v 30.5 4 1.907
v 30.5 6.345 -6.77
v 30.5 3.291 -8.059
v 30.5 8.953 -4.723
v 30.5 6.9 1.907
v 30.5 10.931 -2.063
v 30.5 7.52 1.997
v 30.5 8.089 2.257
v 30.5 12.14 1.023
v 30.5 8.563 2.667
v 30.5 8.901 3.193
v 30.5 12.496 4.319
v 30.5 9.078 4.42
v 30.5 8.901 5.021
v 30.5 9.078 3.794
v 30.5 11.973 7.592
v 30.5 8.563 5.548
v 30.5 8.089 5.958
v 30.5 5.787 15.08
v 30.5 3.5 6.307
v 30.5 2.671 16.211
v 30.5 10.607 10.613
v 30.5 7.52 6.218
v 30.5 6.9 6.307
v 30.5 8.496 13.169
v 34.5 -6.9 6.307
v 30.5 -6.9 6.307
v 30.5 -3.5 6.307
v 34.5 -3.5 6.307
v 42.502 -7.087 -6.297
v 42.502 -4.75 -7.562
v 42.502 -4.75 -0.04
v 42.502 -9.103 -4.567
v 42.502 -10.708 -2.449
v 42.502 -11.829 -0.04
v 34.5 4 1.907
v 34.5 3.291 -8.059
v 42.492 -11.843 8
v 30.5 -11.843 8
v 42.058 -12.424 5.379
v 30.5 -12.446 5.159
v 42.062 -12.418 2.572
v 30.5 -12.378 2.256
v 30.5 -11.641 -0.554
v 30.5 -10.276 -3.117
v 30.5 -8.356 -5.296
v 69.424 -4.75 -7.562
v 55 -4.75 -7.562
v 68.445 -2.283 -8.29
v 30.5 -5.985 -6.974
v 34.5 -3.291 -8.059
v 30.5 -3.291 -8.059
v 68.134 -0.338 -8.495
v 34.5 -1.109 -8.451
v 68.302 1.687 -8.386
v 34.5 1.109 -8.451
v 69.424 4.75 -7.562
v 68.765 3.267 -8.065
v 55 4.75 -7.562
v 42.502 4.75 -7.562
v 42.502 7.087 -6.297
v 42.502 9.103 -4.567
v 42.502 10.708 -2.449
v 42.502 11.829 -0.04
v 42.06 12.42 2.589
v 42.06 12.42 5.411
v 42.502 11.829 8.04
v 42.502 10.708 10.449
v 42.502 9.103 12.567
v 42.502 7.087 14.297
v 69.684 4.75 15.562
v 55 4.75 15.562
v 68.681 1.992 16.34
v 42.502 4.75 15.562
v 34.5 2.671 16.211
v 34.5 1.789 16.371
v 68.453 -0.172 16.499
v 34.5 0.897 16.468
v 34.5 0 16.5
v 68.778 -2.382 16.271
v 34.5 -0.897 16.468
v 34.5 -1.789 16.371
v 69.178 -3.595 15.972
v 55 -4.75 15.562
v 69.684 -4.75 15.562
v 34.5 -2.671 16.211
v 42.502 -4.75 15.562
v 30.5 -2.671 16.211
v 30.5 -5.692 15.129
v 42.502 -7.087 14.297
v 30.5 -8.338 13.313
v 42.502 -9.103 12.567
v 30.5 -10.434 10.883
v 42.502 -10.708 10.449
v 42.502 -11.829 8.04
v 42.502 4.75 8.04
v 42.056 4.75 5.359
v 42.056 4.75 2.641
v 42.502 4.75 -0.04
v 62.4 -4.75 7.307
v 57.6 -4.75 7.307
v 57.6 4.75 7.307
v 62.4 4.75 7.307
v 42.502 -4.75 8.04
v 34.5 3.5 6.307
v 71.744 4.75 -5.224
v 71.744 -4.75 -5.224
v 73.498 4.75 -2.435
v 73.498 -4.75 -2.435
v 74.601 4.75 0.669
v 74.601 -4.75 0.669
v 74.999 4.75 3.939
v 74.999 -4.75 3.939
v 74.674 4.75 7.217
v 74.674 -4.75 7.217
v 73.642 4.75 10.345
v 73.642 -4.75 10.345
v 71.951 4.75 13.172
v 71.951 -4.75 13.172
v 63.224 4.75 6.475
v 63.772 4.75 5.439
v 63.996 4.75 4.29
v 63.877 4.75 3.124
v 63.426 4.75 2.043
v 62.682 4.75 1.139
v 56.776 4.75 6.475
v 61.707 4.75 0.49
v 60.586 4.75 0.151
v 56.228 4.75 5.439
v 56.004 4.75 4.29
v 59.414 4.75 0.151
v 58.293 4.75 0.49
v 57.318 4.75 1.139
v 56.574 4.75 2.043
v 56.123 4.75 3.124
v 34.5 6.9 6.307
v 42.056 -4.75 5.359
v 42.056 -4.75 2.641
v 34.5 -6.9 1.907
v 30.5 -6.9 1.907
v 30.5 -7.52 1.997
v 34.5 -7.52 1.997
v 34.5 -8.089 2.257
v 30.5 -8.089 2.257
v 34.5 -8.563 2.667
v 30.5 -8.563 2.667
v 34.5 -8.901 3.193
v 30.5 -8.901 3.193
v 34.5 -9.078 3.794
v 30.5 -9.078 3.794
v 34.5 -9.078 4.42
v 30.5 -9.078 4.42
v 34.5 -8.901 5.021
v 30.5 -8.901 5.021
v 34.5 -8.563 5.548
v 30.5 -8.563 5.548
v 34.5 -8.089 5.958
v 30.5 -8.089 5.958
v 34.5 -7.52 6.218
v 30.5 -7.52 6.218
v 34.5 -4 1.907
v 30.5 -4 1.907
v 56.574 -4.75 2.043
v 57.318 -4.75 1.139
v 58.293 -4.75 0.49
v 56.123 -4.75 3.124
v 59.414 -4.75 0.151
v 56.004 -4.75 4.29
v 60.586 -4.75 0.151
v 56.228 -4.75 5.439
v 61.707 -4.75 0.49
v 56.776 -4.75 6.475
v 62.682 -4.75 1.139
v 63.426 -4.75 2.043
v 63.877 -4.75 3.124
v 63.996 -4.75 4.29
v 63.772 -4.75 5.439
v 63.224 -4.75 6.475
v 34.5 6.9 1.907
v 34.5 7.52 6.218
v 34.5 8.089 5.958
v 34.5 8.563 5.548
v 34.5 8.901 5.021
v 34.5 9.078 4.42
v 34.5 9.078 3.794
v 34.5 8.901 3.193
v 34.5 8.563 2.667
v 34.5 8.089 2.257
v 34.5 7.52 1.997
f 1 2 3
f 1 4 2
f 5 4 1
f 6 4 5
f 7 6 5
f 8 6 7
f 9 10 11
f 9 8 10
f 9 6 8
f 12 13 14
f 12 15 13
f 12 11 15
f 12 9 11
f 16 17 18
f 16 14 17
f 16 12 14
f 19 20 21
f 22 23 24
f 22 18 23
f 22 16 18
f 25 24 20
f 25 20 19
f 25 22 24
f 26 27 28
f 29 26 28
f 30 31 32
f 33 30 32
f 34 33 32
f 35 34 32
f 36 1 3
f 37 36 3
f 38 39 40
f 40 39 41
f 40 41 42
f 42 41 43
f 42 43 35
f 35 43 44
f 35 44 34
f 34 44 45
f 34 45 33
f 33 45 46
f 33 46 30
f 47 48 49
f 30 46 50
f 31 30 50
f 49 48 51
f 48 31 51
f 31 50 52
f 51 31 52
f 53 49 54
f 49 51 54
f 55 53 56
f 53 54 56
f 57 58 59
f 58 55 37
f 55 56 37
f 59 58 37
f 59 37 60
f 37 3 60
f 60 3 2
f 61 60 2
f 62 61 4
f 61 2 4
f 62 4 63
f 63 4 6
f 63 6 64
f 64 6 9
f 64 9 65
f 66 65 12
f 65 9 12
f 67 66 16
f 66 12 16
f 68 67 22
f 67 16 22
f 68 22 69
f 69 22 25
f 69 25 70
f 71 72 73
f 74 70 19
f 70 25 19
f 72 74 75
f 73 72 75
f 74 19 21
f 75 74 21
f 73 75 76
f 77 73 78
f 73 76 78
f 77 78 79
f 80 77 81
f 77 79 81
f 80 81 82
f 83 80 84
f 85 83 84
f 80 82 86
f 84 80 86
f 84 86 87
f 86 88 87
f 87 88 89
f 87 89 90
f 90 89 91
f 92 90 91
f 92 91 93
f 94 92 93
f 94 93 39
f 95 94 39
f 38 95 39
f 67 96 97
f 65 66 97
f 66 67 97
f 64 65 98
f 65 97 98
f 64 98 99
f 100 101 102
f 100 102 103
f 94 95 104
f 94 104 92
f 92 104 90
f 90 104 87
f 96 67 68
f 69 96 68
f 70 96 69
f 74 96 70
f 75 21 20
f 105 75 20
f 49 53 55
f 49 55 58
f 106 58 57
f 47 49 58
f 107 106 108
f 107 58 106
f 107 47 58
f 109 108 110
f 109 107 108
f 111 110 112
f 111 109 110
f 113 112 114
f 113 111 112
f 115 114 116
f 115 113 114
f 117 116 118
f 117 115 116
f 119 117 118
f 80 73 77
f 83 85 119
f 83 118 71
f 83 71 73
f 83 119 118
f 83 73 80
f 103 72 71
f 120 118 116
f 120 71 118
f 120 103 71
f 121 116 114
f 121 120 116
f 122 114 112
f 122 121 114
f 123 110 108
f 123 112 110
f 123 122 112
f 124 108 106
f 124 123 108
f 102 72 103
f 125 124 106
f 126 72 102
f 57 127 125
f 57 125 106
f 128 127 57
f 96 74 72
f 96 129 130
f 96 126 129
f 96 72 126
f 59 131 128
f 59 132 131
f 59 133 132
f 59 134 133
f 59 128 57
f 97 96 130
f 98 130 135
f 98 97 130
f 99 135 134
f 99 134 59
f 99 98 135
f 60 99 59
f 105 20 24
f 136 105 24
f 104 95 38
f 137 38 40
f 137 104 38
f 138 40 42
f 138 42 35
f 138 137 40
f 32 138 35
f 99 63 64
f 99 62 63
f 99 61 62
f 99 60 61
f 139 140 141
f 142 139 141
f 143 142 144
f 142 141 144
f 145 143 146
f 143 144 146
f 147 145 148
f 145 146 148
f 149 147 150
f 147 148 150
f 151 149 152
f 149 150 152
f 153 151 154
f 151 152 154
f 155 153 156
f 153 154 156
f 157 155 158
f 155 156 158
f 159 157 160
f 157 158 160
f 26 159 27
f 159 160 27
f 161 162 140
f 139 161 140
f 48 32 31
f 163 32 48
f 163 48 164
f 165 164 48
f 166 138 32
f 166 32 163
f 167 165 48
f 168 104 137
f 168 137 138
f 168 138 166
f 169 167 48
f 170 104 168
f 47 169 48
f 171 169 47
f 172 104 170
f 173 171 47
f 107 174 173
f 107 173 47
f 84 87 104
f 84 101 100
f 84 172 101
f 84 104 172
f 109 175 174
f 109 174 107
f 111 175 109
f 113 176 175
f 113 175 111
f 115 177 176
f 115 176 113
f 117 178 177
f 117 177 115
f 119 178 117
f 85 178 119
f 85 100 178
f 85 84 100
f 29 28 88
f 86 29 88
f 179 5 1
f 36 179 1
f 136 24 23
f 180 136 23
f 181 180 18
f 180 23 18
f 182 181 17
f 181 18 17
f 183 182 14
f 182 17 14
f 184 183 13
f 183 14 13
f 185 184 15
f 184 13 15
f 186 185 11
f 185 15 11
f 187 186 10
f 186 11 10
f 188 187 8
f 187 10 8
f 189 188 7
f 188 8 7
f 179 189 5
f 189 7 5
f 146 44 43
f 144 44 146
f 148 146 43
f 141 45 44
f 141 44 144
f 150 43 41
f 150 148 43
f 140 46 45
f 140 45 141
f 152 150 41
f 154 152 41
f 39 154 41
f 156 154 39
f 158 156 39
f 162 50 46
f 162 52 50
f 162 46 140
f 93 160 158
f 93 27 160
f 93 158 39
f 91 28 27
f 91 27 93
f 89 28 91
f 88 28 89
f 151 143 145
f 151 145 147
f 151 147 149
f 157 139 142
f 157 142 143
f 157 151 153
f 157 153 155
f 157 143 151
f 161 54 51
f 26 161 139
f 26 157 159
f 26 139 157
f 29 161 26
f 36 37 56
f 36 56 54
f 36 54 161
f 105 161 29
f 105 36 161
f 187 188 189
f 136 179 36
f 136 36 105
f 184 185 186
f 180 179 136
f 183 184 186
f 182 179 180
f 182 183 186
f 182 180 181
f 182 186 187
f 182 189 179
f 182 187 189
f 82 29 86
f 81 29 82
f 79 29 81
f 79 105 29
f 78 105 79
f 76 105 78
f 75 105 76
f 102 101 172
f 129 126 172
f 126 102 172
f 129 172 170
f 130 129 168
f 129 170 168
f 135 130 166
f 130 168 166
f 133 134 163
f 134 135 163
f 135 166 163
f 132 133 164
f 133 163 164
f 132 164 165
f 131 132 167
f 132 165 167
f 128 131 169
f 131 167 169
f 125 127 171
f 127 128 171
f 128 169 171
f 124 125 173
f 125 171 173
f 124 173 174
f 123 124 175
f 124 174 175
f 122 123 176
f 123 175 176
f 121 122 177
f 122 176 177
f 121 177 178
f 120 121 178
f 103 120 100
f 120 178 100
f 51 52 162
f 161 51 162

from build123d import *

# Parameters (mm, degrees)
SKETCH_1_W                = 50
SKETCH_1_H                = 40
EXTRUDE_1_DEPTH           = 8
CHAMFER_1_SIZE            = 10
SKETCH_2_R                = 1.55
CUT_EXTRUDE_1_DEPTH       = 10
EXTRUDE_2_DEPTH           = 50
EXTRUDE_2_DEPTH_BACK      = 15
SKETCH_3_R                = 12.5
SKETCH_4_R                = 1.7
CUT_EXTRUDE_2_DEPTH       = 15
CUT_EXTRUDE_START         = -20
CUT_EXTRUDE_3_DEPTH       = 20
SKETCH_7_R                = 16.5
CUT_EXTRUDE_8_DEPTH       = 33
CUT_EXTRUDE_9_DEPTH       = 20
CHAMFER_3_SIZE            = 2
SKETCH_10_OUTSIDE_W       = 49.114
SKETCH_10_OUTSIDE_H       = 64.114
SKETCH_10_OUTSIDE_R       = 12.5
CUT_EXTRUDE_10_DEPTH      = 10
CHAMFER_4_SIZE            = 10
SKETCH_12_W               = 1.5
SKETCH_12_H               = 20
SKETCH_14_W               = 12
SKETCH_14_H               = 23
CUT_EXTRUDE_11_DEPTH      = 3
CUT_EXTRUDE_12_DEPTH      = 4.2
SKETCH_16_R               = 1.1
CUT_EXTRUDE_13_DEPTH      = 5
SKETCH_17_R               = 3.372674955
EXTRUDE_3_DEPTH           = 4
SKETCH_18_R               = 1.1
CUT_EXTRUDE_14_DEPTH      = 4
SKETCH_20_R               = 4
CUT_EXTRUDE_15_DEPTH      = 4
CUT_EXTRUDE_16_DEPTH      = 80.355214185
CUT_EXTRUDE_16_DEPTH_BACK = 80.355214185
SKETCH_21_W               = 47.755098741
SKETCH_21_H               = 76.122443719
SKETCH_26_R               = 4
CUT_EXTRUDE_19_DEPTH      = 20
SKETCH_28_W               = 34.99561618
SKETCH_28_H               = 41.128829021
CUT_EXTRUDE_20_DEPTH      = 10
SKETCH_29_W               = 7.599941767
SKETCH_29_H               = 6.479768366
EXTRUDE_6_DEPTH           = 9.5
SKETCH_24_R               = 12.607397707
CUT_EXTRUDE_21_DEPTH      = 15
CUT_EXTRUDE_22_DEPTH      = 4


# Read off the part's stored shape, not the designer's step: 切除-拉伸3
with BuildPart() as part:
    # 草图1 → 凸台-拉伸1 (new body)
    with BuildSketch(Plane.XY):
        Rectangle(SKETCH_1_W, SKETCH_1_H)
    extrude(amount=EXTRUDE_1_DEPTH)

    # 倒角1
    chamfer_1_edges = [part.edges().sort_by_distance(p)[0] for p in [
        (-25, -20, 4),
        (-25, 20, 4),
    ]]
    chamfer(chamfer_1_edges, length=CHAMFER_1_SIZE)

    # 草图2 → 切除-拉伸1 (cut)
    with BuildSketch(Plane.XY.offset(8)):
        with Locations((-2, -10)):
            Circle(SKETCH_2_R)
        with Locations((-2, 10)):
            Circle(SKETCH_2_R)
    extrude(amount=-CUT_EXTRUDE_1_DEPTH, mode=Mode.SUBTRACT)

    # 草图3 → 凸台-拉伸2 (add, two sides: drawn at the far end of the back side and taken through both)
    with BuildSketch(Plane(origin=(25, 0, 0), x_dir=(0, 0, -1), z_dir=(1, 0, 0)).offset(-EXTRUDE_2_DEPTH_BACK)):
        with Locations(Location((-4, 0, 0), (0, 0, 251.337075115))):
            Circle(SKETCH_3_R)
    extrude(amount=EXTRUDE_2_DEPTH + EXTRUDE_2_DEPTH_BACK)

    # 草图4 → 切除-拉伸2 (cut)
    with BuildSketch(Plane.XY.offset(8)):
        with Locations((-19.690178066, -4)):
            Circle(SKETCH_4_R)
        with Locations((-19.690178066, 4)):
            Circle(SKETCH_4_R)
    extrude(amount=-CUT_EXTRUDE_2_DEPTH, mode=Mode.SUBTRACT)

    # 切除-拉伸3 outline → 切除-拉伸3 (cut)
    with BuildSketch(Plane(origin=(75, 0, 0), x_dir=(0, 0, -1), z_dir=(1, 0, 0)).offset(CUT_EXTRUDE_START)):
        with BuildLine():
            Line((7.56233108, -4.75), (-15.56233108, -4.75))
            ThreePointArc((-15.56233108, -4.75), (-4, -12.5), (7.56233108, -4.75))
        make_face()
        with BuildLine():
            ThreePointArc((7.56233108, 4.75), (-4, 12.5), (-15.56233108, 4.75))
            Line((-15.56233108, 4.75), (7.56233108, 4.75))
        make_face()
    extrude(amount=CUT_EXTRUDE_3_DEPTH, mode=Mode.SUBTRACT)

    # 草图7 → 切除-拉伸8 (cut)
    with BuildSketch(Plane.XZ.offset(4.75)):
        with Locations((58.5, 4)):
            Circle(SKETCH_7_R)
    cut_extrude_8 = extrude(amount=CUT_EXTRUDE_8_DEPTH, mode=Mode.SUBTRACT)

    # 镜向1: 切除-拉伸8 across plane
    add(cut_extrude_8.mirror(Plane.ZX), mode=Mode.SUBTRACT)

    # 草图8 → 切除-拉伸9 (cut)
    with BuildSketch(Plane.XZ.offset(4.75)):
        with BuildLine():
            Line((60, 19.107397707), (75.764252489, 33.62580965))
            Line((75.764252489, 33.62580965), (78.826270749, -18.347337912))
            Line((78.826270749, -18.347337912), (60, -10.892602293))
            ThreePointArc((60, -10.892602293), (75, 4.107397707), (60, 19.107397707))
        make_face()
    extrude(amount=-CUT_EXTRUDE_9_DEPTH, mode=Mode.SUBTRACT)

    # 倒角3
    chamfer_3_edges = [part.edges().sort_by_distance(p)[0] for p in [
        (10, 0, 16.5),
        (10, 0, -8.5),
    ]]
    chamfer(chamfer_3_edges, length=CHAMFER_3_SIZE)

    # 草图10 outside → 切除-拉伸10 (cut)
    with BuildSketch(Plane(origin=(25, 0, 0), x_dir=(0, 0, -1), z_dir=(1, 0, 0))):
        with Locations((-4, 0)):
            Rectangle(SKETCH_10_OUTSIDE_W, SKETCH_10_OUTSIDE_H)
        with Locations((-4.107397707, 0)):
            Circle(SKETCH_10_OUTSIDE_R, mode=Mode.SUBTRACT)
    extrude(amount=-CUT_EXTRUDE_10_DEPTH, mode=Mode.SUBTRACT)

    # 倒角4
    # the kernel refuses this chamfer: 10 mm, written as the material it takes off along each edge
    with BuildSketch(Plane(origin=(15, -20, -25.71682988), x_dir=(-0.9996219169112968, -0.027495876610586317, 0), z_dir=(0, 0, 1))) as chamfer_4_piece_1_section:
        Polygon((CHAMFER_4_SIZE * 0.999621916911, -CHAMFER_4_SIZE * 0.0274958766106), (-CHAMFER_4_SIZE * 0.0274958766106, -CHAMFER_4_SIZE * 0.999621916911), (0, 0), align=None)
    chamfer_4_piece_1 = extrude(amount=59.433659759, mode=Mode.PRIVATE)
    chamfer_4_piece_1 = chamfer_4_piece_1 - Plane(origin=(11.669205873, 0, 4.107397707), x_dir=(0, 0, -1), z_dir=(1, 0, 0)) * Cylinder(12.5, 159, mode=Mode.PRIVATE)
    add(chamfer_4_piece_1, mode=Mode.SUBTRACT)
    with BuildSketch(Plane(origin=(15, 20, 33.71682988), x_dir=(-0.9996219169112968, 0.027495876610586317, 0), z_dir=(0, 0, -1))) as chamfer_4_piece_2_section:
        Polygon((CHAMFER_4_SIZE * 0.999621916911, -CHAMFER_4_SIZE * 0.0274958766106), (-CHAMFER_4_SIZE * 0.0274958766106, -CHAMFER_4_SIZE * 0.999621916911), (0, 0), align=None)
    chamfer_4_piece_2 = extrude(amount=59.433659759, mode=Mode.PRIVATE)
    chamfer_4_piece_2 = chamfer_4_piece_2 - Plane(origin=(11.669205873, 0, 4.107397707), x_dir=(0, 0, -1), z_dir=(1, 0, 0)) * Cylinder(12.5, 159, mode=Mode.PRIVATE)
    add(chamfer_4_piece_2, mode=Mode.SUBTRACT)

    # 草图12 → 切除-旋转2 (revolve, cut)
    with BuildSketch(Plane(origin=(0, 0, 0), x_dir=(1, 0, 0), z_dir=(0, 1, 0))):
        with Locations((14.75, 8.392602293)):
            Rectangle(SKETCH_12_W, SKETCH_12_H)
    revolve(axis=Axis((50, 0, 4.107397707), (-1, 0, 0)), mode=Mode.SUBTRACT)

    # 草图14 → 切除-拉伸11 (cut)
    with BuildSketch(Plane(origin=(0, 0, 0), x_dir=(-1, 0, 0), z_dir=(0, 0, -1))):
        with Locations((2, 4.65)):
            Rectangle(SKETCH_14_W, SKETCH_14_H)
    extrude(amount=-CUT_EXTRUDE_11_DEPTH, mode=Mode.SUBTRACT)

    # 草图15 → 切除-拉伸12 (cut)
    with BuildSketch(Plane(origin=(0, 0, 3), x_dir=(-1, 0, 0), z_dir=(0, 0, -1))):
        with BuildLine():
            ThreePointArc((4.631967524, 4.49702381), (2, 16.1), (-0.631967524, 4.49702381))
            ThreePointArc((-0.631967524, 4.49702381), (2, 0.95), (4.631967524, 4.49702381))
        make_face()
    extrude(amount=-CUT_EXTRUDE_12_DEPTH, mode=Mode.SUBTRACT)

    # 草图16 → 切除-拉伸13 (cut)
    with BuildSketch(Plane(origin=(0, 0, 0), x_dir=(-1, 0, 0), z_dir=(0, 0, -1))):
        with Locations((2, 18.3)):
            Circle(SKETCH_16_R)
    extrude(amount=-CUT_EXTRUDE_13_DEPTH, mode=Mode.SUBTRACT)

    # 草图17 → 凸台-拉伸3 (add)
    with BuildSketch(Plane(origin=(0, 0, 0), x_dir=(-1, 0, 0), z_dir=(0, 0, -1))):
        with Locations((2, -10)):
            Circle(SKETCH_17_R)
    extrude(amount=-EXTRUDE_3_DEPTH)

    # 草图18 → 切除-拉伸14 (cut)
    with BuildSketch(Plane(origin=(0, 0, 0), x_dir=(-1, 0, 0), z_dir=(0, 0, -1))):
        with Locations((2, -9)):
            Circle(SKETCH_18_R)
    extrude(amount=-CUT_EXTRUDE_14_DEPTH, mode=Mode.SUBTRACT)

    # 草图20 → 切除-拉伸15 (cut)
    with BuildSketch(Plane(origin=(0, 0, 7.2), x_dir=(-1, 0, 0), z_dir=(0, 0, -1))):
        with Locations((2, 10)):
            Circle(SKETCH_20_R)
    extrude(amount=-CUT_EXTRUDE_15_DEPTH, mode=Mode.SUBTRACT)

    # 草图21 → 切除-拉伸16 (cut, two sides: drawn at the far end of the back side and taken through both)
    with BuildSketch(Plane(origin=(0, 0, 0), x_dir=(-1, 0, 0), z_dir=(0, 0, -1)).offset(-CUT_EXTRUDE_16_DEPTH_BACK)):
        with Locations((8.377549371, -2.117346793)):
            Rectangle(SKETCH_21_W, SKETCH_21_H)
    extrude(amount=CUT_EXTRUDE_16_DEPTH + CUT_EXTRUDE_16_DEPTH_BACK, mode=Mode.SUBTRACT)

    # 草图26 → 切除-拉伸19 (cut)
    with BuildSketch(Plane.XZ.offset(4.75)):
        with Locations((60, 4.107397707)):
            Circle(SKETCH_26_R)
    extrude(amount=-CUT_EXTRUDE_19_DEPTH, mode=Mode.SUBTRACT)

    # 草图28 → 切除-拉伸20 (cut)
    with BuildSketch(Plane.XZ.offset(4.75)):
        with Locations((60, 4.107397707)):
            Rectangle(SKETCH_28_W, SKETCH_28_H)
    cut_extrude_20 = extrude(amount=CUT_EXTRUDE_20_DEPTH, mode=Mode.SUBTRACT)

    # 镜向2: 切除-拉伸20 across plane
    add(cut_extrude_20.mirror(Plane.ZX), mode=Mode.SUBTRACT)

    # 草图29 → 凸台-拉伸6 (add)
    with BuildSketch(Plane.XZ.offset(4.75)):
        with Locations((61.399970884, 10.54728189)):
            Rectangle(SKETCH_29_W, SKETCH_29_H)
    extrude(amount=-EXTRUDE_6_DEPTH)

    # 草图24 → 切除-拉伸21 (cut)
    with BuildSketch(Plane.ZY.offset(-15.5)):
        with Locations((4.107397707, 0)):
            Circle(SKETCH_24_R)
    extrude(amount=-CUT_EXTRUDE_21_DEPTH, mode=Mode.SUBTRACT)

    # 草图30 → 切除-拉伸22 (cut)
    with BuildSketch(Plane.ZY.offset(-30.5)):
        with BuildLine():
            Line((6.307397707, -6.9), (6.307397707, 6.9))
            ThreePointArc((6.307397707, 6.9), (4.107397707, 9.1), (1.907397707, 6.9))
            Line((1.907397707, 6.9), (1.907397707, -6.9))
            ThreePointArc((1.907397707, -6.9), (4.107397707, -9.1), (6.307397707, -6.9))
        make_face()
        with BuildLine():
            Line((-8.058924565, -3.29125179), (1.907397707, -4))
            Line((1.907397707, -4), (1.907397707, 4))
            Line((1.907397707, 4), (-8.058924565, 3.29125179))
            ThreePointArc((-8.058924565, 3.29125179), (-8.5, 0), (-8.058924565, -3.29125179))
        make_face()
        with BuildLine():
            Line((6.307397707, 3.5), (6.307397707, -3.5))
            Line((6.307397707, -3.5), (16.211202868, -2.671427431))
            ThreePointArc((16.211202868, -2.671427431), (16.427590994, -1.343496214), (16.5, 0))
            ThreePointArc((16.5, 0), (16.427590994, 1.343496214), (16.211202868, 2.671427431))
            Line((16.211202868, 2.671427431), (6.307397707, 3.5))
        make_face()
    extrude(amount=-CUT_EXTRUDE_22_DEPTH, mode=Mode.SUBTRACT)


solid = part.part
